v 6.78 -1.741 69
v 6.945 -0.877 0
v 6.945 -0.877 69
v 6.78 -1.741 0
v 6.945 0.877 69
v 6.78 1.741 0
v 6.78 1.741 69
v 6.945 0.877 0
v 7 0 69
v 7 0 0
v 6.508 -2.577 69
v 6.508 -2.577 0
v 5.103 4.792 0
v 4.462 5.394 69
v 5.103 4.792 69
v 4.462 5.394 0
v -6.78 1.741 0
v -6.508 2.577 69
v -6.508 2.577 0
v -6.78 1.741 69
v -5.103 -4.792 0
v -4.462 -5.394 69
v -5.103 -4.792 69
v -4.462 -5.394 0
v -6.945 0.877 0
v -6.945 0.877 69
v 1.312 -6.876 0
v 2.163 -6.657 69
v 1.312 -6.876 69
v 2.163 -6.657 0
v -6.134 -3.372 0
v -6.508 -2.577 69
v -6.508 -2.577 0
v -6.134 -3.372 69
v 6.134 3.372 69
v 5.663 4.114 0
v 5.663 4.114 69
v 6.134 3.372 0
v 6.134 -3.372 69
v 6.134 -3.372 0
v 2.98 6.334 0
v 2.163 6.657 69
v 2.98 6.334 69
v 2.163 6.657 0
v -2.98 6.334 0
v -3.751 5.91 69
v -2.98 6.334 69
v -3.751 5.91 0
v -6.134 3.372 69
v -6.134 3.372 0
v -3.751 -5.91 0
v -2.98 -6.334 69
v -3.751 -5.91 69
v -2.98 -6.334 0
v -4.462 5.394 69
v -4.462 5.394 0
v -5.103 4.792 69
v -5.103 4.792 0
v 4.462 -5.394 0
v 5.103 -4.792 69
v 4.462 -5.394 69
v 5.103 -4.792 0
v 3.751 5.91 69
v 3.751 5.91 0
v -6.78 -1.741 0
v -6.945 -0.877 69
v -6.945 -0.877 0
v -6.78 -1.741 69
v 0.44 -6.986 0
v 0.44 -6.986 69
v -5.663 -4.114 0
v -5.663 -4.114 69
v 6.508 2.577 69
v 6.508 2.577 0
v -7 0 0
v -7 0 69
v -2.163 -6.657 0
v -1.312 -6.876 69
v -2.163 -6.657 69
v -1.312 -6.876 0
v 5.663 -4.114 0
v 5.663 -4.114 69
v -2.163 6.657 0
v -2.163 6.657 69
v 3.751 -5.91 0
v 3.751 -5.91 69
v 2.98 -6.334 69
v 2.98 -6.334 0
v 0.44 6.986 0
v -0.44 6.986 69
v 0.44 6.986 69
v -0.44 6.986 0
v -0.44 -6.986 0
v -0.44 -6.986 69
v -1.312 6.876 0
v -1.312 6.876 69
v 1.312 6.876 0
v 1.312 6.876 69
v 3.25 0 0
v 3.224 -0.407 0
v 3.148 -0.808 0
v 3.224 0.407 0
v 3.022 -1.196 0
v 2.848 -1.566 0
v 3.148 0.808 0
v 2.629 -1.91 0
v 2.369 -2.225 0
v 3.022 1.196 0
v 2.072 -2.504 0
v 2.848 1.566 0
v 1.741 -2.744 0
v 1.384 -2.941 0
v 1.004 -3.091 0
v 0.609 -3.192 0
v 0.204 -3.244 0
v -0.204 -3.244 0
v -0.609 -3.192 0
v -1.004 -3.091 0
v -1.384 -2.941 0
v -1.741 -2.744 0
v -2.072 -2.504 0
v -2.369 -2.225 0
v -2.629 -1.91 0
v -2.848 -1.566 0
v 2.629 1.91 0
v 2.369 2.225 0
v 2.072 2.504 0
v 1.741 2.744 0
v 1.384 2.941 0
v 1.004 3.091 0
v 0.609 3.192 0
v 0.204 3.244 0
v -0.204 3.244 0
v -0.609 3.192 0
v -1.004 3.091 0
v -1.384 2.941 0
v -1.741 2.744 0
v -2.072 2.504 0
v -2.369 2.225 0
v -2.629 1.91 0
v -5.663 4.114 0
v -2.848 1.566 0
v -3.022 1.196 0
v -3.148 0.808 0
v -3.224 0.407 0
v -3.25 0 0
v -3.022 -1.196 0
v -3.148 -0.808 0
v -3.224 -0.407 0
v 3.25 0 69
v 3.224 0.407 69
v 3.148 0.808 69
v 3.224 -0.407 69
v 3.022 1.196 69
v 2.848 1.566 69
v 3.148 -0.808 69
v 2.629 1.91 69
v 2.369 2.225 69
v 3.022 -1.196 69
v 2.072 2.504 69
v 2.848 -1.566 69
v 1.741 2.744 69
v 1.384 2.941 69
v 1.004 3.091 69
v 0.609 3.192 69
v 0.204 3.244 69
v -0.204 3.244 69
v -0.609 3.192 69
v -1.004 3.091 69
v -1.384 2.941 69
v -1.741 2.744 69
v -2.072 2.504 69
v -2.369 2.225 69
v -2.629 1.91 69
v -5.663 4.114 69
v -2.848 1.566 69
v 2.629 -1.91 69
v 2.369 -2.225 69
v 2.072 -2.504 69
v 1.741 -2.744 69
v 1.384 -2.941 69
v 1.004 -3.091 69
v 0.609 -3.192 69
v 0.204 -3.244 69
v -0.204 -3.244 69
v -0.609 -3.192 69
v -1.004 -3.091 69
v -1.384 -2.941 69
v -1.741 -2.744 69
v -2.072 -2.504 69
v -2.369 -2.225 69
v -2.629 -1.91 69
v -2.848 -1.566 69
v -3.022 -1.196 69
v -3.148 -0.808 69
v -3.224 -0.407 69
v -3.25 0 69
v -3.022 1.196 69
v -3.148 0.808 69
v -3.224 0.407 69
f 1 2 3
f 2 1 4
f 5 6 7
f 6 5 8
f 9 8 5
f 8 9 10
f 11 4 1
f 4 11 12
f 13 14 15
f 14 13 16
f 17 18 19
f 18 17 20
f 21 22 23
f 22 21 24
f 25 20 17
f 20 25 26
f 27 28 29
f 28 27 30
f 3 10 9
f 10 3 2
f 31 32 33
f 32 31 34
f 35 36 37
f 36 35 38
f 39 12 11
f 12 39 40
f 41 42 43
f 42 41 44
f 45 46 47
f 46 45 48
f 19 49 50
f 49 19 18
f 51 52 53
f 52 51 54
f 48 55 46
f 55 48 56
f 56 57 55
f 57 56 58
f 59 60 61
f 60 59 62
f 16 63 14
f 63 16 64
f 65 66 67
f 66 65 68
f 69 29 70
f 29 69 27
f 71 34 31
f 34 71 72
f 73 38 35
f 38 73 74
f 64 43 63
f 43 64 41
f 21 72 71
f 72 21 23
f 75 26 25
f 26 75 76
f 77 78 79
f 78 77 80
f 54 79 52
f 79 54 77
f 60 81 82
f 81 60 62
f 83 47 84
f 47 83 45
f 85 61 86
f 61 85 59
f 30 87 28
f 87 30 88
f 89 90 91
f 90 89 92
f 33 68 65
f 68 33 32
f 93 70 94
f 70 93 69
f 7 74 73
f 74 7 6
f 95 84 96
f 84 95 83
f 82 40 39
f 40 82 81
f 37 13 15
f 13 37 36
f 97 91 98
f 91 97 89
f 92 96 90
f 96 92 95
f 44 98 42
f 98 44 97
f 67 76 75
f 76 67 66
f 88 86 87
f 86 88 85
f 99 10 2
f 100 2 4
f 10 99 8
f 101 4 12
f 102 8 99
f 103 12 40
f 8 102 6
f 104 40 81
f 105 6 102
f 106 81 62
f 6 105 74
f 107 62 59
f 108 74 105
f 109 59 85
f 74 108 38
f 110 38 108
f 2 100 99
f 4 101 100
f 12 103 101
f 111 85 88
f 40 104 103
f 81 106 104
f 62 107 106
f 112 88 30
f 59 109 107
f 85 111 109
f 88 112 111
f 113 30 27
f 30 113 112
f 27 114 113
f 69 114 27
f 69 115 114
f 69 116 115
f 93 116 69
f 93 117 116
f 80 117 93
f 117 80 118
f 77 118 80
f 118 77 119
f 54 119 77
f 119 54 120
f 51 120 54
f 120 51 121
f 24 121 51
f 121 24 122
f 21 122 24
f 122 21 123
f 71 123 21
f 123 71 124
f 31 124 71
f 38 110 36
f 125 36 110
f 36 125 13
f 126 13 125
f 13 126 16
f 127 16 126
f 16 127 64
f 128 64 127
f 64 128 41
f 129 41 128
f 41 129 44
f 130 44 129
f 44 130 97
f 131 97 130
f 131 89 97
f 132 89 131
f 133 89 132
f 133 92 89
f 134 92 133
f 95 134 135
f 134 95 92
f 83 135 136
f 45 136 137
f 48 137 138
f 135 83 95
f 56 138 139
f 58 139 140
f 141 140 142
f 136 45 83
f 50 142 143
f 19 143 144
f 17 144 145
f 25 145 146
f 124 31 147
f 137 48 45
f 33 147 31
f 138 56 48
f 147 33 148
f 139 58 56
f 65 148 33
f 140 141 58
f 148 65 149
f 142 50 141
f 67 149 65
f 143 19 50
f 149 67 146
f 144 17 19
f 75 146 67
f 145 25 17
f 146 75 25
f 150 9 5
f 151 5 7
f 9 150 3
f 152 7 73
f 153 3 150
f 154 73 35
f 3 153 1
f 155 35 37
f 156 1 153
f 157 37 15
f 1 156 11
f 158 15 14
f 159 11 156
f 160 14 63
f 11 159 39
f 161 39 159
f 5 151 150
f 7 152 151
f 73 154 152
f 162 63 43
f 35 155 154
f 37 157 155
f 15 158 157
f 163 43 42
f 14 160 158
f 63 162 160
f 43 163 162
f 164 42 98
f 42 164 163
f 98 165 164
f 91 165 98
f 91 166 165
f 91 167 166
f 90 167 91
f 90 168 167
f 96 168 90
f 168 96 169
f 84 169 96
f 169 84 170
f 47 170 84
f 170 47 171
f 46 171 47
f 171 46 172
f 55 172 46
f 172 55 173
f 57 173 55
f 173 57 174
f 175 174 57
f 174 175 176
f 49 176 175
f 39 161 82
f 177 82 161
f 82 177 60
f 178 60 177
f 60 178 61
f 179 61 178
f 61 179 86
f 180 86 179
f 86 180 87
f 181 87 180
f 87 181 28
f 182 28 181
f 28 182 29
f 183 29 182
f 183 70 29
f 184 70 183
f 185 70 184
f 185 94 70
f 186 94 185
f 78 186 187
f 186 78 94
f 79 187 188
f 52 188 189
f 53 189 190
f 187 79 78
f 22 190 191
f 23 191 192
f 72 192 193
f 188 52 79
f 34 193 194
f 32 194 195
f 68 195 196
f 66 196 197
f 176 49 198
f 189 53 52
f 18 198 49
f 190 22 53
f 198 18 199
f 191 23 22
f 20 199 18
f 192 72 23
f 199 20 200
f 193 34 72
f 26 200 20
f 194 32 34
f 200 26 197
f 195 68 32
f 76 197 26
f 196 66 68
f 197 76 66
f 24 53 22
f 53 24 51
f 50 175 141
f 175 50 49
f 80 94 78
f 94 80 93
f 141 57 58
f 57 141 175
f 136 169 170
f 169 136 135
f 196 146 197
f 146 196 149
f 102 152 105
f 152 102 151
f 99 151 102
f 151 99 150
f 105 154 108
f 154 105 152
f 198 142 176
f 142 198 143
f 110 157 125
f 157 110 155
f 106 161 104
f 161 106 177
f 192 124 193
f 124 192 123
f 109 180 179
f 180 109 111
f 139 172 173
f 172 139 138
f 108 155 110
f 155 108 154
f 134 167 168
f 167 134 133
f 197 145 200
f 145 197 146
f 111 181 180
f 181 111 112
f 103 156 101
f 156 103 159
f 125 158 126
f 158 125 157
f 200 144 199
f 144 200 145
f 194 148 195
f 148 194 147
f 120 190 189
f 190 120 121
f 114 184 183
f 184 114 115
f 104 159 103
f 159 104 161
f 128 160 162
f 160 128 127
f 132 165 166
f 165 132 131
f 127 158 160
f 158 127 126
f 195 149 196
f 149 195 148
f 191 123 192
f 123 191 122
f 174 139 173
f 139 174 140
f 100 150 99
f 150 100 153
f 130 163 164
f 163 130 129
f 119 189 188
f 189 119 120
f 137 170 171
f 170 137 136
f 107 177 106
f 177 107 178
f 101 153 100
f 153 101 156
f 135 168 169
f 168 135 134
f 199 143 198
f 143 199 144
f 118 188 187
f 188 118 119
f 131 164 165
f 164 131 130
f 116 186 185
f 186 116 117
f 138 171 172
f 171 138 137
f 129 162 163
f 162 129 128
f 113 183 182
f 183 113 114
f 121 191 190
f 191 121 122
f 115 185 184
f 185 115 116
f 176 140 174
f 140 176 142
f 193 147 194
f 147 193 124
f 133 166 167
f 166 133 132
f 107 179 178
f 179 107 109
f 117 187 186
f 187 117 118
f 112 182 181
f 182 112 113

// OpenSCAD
$fn = 50;


difference() {
	union() {
		cylinder(h = 69, r = 7.0000000000);
	}
	union() {
		translate(v = [0.0000000000, 0.0000000000, -100.0000000000]) {
			cylinder(h = 200, r = 3.2500000000);
		}
	}
}
